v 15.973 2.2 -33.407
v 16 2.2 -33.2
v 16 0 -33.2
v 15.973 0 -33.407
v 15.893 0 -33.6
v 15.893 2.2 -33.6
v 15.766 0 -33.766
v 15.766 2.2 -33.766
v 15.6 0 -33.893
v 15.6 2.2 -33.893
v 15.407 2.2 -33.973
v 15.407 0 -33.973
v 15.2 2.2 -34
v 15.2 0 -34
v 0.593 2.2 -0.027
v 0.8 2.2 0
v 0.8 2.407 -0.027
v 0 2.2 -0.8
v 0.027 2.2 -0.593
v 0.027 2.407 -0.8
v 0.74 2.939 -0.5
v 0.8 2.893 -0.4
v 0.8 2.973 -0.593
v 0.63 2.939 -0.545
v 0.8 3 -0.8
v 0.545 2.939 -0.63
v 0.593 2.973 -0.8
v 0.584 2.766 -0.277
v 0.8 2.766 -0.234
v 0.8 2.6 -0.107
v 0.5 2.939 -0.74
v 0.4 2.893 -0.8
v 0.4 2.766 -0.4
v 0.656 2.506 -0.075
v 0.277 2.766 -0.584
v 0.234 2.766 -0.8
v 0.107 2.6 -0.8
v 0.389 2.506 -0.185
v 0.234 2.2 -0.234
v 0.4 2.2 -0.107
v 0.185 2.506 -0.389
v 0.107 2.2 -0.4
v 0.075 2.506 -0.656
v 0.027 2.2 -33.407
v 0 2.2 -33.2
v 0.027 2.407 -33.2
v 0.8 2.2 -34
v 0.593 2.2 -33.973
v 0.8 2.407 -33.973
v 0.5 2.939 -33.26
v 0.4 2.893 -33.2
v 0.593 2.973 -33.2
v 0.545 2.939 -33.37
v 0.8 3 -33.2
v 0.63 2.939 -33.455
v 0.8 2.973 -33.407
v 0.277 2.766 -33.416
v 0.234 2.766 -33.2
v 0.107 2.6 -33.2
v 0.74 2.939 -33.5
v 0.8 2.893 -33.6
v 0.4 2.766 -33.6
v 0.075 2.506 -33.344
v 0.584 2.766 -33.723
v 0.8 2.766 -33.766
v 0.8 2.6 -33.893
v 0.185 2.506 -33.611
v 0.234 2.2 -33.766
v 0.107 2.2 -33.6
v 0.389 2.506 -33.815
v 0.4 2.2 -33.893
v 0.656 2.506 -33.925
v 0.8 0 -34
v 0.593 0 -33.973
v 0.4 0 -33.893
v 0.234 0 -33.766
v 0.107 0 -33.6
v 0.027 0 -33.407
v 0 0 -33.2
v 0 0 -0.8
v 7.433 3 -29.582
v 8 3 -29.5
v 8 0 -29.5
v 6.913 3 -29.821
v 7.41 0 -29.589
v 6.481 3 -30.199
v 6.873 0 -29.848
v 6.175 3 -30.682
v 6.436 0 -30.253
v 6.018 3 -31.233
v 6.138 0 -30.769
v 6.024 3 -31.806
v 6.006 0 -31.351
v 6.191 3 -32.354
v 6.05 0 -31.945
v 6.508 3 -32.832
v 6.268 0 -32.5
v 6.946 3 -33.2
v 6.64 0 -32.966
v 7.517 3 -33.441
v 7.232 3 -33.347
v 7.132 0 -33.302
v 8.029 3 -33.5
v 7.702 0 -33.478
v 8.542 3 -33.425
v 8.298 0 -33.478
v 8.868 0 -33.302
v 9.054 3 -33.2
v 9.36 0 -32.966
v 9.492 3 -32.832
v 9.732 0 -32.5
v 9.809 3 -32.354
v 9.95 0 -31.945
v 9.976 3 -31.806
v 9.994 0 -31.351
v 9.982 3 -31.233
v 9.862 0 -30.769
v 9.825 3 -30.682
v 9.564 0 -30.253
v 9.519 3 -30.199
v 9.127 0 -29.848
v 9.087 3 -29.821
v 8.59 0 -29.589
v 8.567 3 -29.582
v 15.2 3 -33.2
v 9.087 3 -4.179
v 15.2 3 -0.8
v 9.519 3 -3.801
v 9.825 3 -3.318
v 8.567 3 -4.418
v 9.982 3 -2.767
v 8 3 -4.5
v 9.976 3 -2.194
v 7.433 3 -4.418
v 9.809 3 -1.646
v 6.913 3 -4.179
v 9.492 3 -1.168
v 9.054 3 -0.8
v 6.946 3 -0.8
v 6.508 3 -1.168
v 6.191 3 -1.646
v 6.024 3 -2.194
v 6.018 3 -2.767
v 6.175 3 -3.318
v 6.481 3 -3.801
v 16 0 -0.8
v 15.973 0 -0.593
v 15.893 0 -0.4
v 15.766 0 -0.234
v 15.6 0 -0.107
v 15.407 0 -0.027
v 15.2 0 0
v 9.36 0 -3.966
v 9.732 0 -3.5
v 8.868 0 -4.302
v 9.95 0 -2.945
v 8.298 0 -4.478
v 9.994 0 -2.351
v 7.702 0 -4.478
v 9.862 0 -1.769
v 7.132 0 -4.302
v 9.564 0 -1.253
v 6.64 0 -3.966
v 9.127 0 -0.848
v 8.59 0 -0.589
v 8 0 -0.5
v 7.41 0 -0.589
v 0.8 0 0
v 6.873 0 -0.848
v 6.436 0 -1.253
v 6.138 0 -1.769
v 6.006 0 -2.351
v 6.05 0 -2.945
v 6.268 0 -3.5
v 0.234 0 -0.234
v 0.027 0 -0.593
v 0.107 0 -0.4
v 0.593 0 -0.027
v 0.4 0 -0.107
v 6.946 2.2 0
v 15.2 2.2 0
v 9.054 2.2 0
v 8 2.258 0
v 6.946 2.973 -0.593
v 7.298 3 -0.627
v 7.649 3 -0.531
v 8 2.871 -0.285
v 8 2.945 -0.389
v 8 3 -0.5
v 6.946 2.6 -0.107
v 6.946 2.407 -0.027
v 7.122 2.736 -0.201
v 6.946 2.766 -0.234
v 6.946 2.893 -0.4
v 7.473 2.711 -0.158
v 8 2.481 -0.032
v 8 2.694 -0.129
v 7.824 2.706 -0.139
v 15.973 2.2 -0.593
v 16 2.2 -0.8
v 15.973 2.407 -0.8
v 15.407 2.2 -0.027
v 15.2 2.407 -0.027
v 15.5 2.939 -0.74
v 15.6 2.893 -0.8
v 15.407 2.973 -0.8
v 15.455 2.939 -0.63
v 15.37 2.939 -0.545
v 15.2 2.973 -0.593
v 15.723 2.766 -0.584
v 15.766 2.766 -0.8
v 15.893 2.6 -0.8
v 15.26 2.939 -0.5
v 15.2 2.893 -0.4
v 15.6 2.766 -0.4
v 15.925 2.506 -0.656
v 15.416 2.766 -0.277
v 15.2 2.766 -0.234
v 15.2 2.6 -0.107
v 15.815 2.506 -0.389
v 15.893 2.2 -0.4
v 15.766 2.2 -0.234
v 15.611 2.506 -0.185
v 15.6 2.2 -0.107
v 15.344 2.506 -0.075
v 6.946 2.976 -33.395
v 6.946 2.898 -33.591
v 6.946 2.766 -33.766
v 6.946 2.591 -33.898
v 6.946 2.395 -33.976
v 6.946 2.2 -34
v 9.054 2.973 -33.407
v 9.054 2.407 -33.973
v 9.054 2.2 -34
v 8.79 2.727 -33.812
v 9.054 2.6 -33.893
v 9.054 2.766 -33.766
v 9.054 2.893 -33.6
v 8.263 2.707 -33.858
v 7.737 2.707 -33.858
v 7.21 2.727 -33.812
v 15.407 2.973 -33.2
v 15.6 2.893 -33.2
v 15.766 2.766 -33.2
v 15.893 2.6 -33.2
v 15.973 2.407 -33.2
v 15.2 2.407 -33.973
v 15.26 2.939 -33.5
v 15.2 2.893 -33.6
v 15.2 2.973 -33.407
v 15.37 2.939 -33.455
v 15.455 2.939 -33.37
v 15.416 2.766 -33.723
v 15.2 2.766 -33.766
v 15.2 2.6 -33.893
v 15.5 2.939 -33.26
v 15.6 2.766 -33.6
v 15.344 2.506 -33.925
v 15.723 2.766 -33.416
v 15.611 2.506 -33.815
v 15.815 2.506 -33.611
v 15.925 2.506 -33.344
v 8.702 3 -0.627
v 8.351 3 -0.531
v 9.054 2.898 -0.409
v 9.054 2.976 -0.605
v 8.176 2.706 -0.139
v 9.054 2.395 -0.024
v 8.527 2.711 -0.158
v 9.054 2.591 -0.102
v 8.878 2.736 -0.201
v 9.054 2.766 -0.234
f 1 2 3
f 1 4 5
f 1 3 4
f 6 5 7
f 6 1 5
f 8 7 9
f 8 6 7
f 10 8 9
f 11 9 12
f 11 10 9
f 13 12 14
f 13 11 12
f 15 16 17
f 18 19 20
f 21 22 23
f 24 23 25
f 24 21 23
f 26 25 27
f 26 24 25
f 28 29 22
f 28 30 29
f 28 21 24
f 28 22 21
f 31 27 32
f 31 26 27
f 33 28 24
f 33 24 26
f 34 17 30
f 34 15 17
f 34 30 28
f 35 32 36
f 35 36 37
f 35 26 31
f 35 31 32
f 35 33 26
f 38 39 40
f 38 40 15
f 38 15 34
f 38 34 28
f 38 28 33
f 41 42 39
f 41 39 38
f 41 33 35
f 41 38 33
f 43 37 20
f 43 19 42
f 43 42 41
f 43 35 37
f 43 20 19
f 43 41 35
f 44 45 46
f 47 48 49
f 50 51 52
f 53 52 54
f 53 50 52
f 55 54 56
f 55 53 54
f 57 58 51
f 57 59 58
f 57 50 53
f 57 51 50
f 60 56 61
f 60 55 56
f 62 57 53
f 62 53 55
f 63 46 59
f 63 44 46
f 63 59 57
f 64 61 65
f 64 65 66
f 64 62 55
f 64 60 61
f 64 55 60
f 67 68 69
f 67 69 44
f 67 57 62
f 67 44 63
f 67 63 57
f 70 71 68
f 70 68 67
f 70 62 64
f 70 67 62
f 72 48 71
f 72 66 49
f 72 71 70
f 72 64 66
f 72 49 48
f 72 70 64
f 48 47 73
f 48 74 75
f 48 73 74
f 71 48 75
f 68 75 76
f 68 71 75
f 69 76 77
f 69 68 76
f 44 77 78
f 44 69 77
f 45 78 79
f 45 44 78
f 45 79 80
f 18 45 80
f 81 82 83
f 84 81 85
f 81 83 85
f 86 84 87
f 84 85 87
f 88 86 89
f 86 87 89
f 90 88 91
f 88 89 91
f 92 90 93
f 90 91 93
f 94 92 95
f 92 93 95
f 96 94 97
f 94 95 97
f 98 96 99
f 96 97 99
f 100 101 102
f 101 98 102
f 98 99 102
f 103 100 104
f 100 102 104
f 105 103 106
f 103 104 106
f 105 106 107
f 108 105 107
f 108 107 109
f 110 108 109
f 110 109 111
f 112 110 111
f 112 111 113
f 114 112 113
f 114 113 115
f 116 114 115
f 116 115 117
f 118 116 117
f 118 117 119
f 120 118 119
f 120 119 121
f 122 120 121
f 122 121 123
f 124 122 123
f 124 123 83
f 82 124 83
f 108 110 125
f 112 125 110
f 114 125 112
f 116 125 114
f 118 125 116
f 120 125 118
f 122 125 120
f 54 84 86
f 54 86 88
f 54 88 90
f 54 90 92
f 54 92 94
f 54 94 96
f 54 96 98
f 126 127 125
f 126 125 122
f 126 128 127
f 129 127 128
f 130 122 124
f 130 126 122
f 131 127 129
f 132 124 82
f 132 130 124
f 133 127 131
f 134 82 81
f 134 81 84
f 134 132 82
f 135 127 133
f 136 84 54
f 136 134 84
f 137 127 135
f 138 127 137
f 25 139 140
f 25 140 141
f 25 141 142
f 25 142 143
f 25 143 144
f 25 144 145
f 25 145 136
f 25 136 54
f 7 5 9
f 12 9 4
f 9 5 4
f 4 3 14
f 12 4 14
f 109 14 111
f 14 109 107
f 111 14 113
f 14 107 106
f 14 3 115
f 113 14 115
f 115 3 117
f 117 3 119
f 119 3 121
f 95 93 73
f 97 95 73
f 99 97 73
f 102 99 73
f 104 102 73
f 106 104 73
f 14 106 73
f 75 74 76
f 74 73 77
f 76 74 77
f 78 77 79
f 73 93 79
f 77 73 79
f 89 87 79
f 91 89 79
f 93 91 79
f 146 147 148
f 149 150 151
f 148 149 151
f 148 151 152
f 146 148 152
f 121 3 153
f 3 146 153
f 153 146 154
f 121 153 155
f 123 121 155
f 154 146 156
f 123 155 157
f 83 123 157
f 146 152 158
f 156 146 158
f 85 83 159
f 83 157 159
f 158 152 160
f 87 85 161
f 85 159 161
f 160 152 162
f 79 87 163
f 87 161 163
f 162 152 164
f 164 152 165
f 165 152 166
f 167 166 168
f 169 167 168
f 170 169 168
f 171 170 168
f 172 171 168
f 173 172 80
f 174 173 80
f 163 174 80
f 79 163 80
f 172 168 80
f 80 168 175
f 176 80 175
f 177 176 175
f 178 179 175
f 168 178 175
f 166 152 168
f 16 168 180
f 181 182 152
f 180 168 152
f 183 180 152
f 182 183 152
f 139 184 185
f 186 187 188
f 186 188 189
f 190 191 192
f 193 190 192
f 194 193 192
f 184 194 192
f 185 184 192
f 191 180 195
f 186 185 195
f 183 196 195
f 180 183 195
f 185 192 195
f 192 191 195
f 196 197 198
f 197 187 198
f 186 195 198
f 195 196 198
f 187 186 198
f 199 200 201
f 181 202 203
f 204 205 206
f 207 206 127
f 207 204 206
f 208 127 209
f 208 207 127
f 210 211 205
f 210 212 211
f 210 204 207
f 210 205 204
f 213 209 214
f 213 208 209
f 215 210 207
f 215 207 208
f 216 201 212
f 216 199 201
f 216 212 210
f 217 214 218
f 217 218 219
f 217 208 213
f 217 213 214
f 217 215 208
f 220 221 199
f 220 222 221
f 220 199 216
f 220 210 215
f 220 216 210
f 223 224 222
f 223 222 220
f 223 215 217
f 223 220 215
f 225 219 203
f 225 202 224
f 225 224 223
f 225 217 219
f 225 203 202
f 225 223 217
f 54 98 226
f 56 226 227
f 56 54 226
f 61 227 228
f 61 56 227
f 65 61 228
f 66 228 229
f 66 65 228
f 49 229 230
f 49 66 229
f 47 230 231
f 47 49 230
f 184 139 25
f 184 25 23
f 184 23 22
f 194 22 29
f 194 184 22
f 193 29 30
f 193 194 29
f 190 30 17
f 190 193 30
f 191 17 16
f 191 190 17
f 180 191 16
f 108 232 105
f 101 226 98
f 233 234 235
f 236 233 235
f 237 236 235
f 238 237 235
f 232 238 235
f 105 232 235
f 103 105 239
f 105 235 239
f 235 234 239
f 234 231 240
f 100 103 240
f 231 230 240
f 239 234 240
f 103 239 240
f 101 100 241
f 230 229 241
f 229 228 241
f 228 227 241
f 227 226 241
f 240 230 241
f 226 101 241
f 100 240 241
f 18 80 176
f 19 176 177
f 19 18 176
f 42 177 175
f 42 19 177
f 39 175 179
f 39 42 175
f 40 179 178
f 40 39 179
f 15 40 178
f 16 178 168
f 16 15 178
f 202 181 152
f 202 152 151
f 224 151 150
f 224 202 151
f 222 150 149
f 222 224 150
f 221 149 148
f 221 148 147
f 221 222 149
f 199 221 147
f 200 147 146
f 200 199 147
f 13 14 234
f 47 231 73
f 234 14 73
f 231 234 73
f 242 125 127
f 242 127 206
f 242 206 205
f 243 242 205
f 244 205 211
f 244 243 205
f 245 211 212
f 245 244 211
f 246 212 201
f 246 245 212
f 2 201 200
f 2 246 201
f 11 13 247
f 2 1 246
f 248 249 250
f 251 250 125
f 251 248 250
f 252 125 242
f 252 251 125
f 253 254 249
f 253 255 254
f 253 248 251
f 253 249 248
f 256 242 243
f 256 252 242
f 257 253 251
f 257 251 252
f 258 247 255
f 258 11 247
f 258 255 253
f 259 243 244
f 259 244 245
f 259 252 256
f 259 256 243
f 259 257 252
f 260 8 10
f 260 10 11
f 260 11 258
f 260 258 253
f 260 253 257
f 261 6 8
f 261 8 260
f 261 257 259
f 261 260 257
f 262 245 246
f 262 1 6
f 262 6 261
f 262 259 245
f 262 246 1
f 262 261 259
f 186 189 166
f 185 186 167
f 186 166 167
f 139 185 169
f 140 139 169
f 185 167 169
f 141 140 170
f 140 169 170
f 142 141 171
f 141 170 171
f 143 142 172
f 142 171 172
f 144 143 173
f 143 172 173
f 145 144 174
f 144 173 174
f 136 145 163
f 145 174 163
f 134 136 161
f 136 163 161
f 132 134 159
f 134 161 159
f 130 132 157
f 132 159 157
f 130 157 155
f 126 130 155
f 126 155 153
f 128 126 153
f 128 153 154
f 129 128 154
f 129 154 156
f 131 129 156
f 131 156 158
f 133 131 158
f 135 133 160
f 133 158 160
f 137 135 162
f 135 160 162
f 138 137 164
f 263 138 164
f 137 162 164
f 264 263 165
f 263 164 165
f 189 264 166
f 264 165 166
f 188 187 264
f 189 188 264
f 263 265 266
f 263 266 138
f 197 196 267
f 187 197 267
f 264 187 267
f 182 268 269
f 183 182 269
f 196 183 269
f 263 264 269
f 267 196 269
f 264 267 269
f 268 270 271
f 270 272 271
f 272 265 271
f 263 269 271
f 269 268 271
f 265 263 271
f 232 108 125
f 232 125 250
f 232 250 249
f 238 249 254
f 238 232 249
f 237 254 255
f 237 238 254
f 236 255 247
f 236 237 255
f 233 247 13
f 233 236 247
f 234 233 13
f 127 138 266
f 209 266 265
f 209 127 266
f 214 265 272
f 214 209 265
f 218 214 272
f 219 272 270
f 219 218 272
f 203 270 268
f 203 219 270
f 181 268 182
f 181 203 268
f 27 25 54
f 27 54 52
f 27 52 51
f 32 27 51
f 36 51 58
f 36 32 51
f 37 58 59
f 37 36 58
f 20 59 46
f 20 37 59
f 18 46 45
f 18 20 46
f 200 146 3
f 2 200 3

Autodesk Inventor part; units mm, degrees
ref_plane "YZ Plane" through (0, 0, 0) normal (1, 0, 0) x (0, 1, 0)
ref_plane "XZ Plane" through (0, 0, 0) normal (0, 1, 0) x (-1, 0, 0)
ref_plane "XY Plane" through (0, 0, 0) normal (0, 0, 1) x (1, 0, 0)
sketch "Sketch1" plane through (0, 0, 0) normal (0, 1, 0) x (-1, 0, 0)
  line L0 (0, 0) -> (-16, 0)
  line L1 (-16, 0) -> (-16, -34)
  line L2 (-16, -34) -> (0, -34)
  line L3 (0, -34) -> (0, 0)
  dimension "d0" = 16
  dimension "d1" = 34
extrude "Extrusion1" add sketch "Sketch1" along normal blind 3
sketch "Sketch2" plane through (0, 3, 0) normal (0, 1, 0) x (1, 0, 0)
  line L0 (0, 0) -> (16, 0) projected
  line L1 (8, 0) -> (8, 2.5)
  line L2 (16, 34) -> (0, 34) projected
  line L3 (8, 34) -> (8, 31.5)
  dimension "d4" = 2.5
  dimension "d5" = 2.5
hole "Hole1" at (8, 3, -31.5) at (8, 3, -2.5) direction (0, -1, 0) diameter 4 depth 10 tip angle 118
fillet "Fillet1" radius 0.8 8 edges at (0, 1.5, 0) (0, 1.5, -34) (16, 1.5, 0) (16, 1.5, -34) (16, 3, -17) (8, 3, -34) (0, 3, -17) (8, 3, 0)
